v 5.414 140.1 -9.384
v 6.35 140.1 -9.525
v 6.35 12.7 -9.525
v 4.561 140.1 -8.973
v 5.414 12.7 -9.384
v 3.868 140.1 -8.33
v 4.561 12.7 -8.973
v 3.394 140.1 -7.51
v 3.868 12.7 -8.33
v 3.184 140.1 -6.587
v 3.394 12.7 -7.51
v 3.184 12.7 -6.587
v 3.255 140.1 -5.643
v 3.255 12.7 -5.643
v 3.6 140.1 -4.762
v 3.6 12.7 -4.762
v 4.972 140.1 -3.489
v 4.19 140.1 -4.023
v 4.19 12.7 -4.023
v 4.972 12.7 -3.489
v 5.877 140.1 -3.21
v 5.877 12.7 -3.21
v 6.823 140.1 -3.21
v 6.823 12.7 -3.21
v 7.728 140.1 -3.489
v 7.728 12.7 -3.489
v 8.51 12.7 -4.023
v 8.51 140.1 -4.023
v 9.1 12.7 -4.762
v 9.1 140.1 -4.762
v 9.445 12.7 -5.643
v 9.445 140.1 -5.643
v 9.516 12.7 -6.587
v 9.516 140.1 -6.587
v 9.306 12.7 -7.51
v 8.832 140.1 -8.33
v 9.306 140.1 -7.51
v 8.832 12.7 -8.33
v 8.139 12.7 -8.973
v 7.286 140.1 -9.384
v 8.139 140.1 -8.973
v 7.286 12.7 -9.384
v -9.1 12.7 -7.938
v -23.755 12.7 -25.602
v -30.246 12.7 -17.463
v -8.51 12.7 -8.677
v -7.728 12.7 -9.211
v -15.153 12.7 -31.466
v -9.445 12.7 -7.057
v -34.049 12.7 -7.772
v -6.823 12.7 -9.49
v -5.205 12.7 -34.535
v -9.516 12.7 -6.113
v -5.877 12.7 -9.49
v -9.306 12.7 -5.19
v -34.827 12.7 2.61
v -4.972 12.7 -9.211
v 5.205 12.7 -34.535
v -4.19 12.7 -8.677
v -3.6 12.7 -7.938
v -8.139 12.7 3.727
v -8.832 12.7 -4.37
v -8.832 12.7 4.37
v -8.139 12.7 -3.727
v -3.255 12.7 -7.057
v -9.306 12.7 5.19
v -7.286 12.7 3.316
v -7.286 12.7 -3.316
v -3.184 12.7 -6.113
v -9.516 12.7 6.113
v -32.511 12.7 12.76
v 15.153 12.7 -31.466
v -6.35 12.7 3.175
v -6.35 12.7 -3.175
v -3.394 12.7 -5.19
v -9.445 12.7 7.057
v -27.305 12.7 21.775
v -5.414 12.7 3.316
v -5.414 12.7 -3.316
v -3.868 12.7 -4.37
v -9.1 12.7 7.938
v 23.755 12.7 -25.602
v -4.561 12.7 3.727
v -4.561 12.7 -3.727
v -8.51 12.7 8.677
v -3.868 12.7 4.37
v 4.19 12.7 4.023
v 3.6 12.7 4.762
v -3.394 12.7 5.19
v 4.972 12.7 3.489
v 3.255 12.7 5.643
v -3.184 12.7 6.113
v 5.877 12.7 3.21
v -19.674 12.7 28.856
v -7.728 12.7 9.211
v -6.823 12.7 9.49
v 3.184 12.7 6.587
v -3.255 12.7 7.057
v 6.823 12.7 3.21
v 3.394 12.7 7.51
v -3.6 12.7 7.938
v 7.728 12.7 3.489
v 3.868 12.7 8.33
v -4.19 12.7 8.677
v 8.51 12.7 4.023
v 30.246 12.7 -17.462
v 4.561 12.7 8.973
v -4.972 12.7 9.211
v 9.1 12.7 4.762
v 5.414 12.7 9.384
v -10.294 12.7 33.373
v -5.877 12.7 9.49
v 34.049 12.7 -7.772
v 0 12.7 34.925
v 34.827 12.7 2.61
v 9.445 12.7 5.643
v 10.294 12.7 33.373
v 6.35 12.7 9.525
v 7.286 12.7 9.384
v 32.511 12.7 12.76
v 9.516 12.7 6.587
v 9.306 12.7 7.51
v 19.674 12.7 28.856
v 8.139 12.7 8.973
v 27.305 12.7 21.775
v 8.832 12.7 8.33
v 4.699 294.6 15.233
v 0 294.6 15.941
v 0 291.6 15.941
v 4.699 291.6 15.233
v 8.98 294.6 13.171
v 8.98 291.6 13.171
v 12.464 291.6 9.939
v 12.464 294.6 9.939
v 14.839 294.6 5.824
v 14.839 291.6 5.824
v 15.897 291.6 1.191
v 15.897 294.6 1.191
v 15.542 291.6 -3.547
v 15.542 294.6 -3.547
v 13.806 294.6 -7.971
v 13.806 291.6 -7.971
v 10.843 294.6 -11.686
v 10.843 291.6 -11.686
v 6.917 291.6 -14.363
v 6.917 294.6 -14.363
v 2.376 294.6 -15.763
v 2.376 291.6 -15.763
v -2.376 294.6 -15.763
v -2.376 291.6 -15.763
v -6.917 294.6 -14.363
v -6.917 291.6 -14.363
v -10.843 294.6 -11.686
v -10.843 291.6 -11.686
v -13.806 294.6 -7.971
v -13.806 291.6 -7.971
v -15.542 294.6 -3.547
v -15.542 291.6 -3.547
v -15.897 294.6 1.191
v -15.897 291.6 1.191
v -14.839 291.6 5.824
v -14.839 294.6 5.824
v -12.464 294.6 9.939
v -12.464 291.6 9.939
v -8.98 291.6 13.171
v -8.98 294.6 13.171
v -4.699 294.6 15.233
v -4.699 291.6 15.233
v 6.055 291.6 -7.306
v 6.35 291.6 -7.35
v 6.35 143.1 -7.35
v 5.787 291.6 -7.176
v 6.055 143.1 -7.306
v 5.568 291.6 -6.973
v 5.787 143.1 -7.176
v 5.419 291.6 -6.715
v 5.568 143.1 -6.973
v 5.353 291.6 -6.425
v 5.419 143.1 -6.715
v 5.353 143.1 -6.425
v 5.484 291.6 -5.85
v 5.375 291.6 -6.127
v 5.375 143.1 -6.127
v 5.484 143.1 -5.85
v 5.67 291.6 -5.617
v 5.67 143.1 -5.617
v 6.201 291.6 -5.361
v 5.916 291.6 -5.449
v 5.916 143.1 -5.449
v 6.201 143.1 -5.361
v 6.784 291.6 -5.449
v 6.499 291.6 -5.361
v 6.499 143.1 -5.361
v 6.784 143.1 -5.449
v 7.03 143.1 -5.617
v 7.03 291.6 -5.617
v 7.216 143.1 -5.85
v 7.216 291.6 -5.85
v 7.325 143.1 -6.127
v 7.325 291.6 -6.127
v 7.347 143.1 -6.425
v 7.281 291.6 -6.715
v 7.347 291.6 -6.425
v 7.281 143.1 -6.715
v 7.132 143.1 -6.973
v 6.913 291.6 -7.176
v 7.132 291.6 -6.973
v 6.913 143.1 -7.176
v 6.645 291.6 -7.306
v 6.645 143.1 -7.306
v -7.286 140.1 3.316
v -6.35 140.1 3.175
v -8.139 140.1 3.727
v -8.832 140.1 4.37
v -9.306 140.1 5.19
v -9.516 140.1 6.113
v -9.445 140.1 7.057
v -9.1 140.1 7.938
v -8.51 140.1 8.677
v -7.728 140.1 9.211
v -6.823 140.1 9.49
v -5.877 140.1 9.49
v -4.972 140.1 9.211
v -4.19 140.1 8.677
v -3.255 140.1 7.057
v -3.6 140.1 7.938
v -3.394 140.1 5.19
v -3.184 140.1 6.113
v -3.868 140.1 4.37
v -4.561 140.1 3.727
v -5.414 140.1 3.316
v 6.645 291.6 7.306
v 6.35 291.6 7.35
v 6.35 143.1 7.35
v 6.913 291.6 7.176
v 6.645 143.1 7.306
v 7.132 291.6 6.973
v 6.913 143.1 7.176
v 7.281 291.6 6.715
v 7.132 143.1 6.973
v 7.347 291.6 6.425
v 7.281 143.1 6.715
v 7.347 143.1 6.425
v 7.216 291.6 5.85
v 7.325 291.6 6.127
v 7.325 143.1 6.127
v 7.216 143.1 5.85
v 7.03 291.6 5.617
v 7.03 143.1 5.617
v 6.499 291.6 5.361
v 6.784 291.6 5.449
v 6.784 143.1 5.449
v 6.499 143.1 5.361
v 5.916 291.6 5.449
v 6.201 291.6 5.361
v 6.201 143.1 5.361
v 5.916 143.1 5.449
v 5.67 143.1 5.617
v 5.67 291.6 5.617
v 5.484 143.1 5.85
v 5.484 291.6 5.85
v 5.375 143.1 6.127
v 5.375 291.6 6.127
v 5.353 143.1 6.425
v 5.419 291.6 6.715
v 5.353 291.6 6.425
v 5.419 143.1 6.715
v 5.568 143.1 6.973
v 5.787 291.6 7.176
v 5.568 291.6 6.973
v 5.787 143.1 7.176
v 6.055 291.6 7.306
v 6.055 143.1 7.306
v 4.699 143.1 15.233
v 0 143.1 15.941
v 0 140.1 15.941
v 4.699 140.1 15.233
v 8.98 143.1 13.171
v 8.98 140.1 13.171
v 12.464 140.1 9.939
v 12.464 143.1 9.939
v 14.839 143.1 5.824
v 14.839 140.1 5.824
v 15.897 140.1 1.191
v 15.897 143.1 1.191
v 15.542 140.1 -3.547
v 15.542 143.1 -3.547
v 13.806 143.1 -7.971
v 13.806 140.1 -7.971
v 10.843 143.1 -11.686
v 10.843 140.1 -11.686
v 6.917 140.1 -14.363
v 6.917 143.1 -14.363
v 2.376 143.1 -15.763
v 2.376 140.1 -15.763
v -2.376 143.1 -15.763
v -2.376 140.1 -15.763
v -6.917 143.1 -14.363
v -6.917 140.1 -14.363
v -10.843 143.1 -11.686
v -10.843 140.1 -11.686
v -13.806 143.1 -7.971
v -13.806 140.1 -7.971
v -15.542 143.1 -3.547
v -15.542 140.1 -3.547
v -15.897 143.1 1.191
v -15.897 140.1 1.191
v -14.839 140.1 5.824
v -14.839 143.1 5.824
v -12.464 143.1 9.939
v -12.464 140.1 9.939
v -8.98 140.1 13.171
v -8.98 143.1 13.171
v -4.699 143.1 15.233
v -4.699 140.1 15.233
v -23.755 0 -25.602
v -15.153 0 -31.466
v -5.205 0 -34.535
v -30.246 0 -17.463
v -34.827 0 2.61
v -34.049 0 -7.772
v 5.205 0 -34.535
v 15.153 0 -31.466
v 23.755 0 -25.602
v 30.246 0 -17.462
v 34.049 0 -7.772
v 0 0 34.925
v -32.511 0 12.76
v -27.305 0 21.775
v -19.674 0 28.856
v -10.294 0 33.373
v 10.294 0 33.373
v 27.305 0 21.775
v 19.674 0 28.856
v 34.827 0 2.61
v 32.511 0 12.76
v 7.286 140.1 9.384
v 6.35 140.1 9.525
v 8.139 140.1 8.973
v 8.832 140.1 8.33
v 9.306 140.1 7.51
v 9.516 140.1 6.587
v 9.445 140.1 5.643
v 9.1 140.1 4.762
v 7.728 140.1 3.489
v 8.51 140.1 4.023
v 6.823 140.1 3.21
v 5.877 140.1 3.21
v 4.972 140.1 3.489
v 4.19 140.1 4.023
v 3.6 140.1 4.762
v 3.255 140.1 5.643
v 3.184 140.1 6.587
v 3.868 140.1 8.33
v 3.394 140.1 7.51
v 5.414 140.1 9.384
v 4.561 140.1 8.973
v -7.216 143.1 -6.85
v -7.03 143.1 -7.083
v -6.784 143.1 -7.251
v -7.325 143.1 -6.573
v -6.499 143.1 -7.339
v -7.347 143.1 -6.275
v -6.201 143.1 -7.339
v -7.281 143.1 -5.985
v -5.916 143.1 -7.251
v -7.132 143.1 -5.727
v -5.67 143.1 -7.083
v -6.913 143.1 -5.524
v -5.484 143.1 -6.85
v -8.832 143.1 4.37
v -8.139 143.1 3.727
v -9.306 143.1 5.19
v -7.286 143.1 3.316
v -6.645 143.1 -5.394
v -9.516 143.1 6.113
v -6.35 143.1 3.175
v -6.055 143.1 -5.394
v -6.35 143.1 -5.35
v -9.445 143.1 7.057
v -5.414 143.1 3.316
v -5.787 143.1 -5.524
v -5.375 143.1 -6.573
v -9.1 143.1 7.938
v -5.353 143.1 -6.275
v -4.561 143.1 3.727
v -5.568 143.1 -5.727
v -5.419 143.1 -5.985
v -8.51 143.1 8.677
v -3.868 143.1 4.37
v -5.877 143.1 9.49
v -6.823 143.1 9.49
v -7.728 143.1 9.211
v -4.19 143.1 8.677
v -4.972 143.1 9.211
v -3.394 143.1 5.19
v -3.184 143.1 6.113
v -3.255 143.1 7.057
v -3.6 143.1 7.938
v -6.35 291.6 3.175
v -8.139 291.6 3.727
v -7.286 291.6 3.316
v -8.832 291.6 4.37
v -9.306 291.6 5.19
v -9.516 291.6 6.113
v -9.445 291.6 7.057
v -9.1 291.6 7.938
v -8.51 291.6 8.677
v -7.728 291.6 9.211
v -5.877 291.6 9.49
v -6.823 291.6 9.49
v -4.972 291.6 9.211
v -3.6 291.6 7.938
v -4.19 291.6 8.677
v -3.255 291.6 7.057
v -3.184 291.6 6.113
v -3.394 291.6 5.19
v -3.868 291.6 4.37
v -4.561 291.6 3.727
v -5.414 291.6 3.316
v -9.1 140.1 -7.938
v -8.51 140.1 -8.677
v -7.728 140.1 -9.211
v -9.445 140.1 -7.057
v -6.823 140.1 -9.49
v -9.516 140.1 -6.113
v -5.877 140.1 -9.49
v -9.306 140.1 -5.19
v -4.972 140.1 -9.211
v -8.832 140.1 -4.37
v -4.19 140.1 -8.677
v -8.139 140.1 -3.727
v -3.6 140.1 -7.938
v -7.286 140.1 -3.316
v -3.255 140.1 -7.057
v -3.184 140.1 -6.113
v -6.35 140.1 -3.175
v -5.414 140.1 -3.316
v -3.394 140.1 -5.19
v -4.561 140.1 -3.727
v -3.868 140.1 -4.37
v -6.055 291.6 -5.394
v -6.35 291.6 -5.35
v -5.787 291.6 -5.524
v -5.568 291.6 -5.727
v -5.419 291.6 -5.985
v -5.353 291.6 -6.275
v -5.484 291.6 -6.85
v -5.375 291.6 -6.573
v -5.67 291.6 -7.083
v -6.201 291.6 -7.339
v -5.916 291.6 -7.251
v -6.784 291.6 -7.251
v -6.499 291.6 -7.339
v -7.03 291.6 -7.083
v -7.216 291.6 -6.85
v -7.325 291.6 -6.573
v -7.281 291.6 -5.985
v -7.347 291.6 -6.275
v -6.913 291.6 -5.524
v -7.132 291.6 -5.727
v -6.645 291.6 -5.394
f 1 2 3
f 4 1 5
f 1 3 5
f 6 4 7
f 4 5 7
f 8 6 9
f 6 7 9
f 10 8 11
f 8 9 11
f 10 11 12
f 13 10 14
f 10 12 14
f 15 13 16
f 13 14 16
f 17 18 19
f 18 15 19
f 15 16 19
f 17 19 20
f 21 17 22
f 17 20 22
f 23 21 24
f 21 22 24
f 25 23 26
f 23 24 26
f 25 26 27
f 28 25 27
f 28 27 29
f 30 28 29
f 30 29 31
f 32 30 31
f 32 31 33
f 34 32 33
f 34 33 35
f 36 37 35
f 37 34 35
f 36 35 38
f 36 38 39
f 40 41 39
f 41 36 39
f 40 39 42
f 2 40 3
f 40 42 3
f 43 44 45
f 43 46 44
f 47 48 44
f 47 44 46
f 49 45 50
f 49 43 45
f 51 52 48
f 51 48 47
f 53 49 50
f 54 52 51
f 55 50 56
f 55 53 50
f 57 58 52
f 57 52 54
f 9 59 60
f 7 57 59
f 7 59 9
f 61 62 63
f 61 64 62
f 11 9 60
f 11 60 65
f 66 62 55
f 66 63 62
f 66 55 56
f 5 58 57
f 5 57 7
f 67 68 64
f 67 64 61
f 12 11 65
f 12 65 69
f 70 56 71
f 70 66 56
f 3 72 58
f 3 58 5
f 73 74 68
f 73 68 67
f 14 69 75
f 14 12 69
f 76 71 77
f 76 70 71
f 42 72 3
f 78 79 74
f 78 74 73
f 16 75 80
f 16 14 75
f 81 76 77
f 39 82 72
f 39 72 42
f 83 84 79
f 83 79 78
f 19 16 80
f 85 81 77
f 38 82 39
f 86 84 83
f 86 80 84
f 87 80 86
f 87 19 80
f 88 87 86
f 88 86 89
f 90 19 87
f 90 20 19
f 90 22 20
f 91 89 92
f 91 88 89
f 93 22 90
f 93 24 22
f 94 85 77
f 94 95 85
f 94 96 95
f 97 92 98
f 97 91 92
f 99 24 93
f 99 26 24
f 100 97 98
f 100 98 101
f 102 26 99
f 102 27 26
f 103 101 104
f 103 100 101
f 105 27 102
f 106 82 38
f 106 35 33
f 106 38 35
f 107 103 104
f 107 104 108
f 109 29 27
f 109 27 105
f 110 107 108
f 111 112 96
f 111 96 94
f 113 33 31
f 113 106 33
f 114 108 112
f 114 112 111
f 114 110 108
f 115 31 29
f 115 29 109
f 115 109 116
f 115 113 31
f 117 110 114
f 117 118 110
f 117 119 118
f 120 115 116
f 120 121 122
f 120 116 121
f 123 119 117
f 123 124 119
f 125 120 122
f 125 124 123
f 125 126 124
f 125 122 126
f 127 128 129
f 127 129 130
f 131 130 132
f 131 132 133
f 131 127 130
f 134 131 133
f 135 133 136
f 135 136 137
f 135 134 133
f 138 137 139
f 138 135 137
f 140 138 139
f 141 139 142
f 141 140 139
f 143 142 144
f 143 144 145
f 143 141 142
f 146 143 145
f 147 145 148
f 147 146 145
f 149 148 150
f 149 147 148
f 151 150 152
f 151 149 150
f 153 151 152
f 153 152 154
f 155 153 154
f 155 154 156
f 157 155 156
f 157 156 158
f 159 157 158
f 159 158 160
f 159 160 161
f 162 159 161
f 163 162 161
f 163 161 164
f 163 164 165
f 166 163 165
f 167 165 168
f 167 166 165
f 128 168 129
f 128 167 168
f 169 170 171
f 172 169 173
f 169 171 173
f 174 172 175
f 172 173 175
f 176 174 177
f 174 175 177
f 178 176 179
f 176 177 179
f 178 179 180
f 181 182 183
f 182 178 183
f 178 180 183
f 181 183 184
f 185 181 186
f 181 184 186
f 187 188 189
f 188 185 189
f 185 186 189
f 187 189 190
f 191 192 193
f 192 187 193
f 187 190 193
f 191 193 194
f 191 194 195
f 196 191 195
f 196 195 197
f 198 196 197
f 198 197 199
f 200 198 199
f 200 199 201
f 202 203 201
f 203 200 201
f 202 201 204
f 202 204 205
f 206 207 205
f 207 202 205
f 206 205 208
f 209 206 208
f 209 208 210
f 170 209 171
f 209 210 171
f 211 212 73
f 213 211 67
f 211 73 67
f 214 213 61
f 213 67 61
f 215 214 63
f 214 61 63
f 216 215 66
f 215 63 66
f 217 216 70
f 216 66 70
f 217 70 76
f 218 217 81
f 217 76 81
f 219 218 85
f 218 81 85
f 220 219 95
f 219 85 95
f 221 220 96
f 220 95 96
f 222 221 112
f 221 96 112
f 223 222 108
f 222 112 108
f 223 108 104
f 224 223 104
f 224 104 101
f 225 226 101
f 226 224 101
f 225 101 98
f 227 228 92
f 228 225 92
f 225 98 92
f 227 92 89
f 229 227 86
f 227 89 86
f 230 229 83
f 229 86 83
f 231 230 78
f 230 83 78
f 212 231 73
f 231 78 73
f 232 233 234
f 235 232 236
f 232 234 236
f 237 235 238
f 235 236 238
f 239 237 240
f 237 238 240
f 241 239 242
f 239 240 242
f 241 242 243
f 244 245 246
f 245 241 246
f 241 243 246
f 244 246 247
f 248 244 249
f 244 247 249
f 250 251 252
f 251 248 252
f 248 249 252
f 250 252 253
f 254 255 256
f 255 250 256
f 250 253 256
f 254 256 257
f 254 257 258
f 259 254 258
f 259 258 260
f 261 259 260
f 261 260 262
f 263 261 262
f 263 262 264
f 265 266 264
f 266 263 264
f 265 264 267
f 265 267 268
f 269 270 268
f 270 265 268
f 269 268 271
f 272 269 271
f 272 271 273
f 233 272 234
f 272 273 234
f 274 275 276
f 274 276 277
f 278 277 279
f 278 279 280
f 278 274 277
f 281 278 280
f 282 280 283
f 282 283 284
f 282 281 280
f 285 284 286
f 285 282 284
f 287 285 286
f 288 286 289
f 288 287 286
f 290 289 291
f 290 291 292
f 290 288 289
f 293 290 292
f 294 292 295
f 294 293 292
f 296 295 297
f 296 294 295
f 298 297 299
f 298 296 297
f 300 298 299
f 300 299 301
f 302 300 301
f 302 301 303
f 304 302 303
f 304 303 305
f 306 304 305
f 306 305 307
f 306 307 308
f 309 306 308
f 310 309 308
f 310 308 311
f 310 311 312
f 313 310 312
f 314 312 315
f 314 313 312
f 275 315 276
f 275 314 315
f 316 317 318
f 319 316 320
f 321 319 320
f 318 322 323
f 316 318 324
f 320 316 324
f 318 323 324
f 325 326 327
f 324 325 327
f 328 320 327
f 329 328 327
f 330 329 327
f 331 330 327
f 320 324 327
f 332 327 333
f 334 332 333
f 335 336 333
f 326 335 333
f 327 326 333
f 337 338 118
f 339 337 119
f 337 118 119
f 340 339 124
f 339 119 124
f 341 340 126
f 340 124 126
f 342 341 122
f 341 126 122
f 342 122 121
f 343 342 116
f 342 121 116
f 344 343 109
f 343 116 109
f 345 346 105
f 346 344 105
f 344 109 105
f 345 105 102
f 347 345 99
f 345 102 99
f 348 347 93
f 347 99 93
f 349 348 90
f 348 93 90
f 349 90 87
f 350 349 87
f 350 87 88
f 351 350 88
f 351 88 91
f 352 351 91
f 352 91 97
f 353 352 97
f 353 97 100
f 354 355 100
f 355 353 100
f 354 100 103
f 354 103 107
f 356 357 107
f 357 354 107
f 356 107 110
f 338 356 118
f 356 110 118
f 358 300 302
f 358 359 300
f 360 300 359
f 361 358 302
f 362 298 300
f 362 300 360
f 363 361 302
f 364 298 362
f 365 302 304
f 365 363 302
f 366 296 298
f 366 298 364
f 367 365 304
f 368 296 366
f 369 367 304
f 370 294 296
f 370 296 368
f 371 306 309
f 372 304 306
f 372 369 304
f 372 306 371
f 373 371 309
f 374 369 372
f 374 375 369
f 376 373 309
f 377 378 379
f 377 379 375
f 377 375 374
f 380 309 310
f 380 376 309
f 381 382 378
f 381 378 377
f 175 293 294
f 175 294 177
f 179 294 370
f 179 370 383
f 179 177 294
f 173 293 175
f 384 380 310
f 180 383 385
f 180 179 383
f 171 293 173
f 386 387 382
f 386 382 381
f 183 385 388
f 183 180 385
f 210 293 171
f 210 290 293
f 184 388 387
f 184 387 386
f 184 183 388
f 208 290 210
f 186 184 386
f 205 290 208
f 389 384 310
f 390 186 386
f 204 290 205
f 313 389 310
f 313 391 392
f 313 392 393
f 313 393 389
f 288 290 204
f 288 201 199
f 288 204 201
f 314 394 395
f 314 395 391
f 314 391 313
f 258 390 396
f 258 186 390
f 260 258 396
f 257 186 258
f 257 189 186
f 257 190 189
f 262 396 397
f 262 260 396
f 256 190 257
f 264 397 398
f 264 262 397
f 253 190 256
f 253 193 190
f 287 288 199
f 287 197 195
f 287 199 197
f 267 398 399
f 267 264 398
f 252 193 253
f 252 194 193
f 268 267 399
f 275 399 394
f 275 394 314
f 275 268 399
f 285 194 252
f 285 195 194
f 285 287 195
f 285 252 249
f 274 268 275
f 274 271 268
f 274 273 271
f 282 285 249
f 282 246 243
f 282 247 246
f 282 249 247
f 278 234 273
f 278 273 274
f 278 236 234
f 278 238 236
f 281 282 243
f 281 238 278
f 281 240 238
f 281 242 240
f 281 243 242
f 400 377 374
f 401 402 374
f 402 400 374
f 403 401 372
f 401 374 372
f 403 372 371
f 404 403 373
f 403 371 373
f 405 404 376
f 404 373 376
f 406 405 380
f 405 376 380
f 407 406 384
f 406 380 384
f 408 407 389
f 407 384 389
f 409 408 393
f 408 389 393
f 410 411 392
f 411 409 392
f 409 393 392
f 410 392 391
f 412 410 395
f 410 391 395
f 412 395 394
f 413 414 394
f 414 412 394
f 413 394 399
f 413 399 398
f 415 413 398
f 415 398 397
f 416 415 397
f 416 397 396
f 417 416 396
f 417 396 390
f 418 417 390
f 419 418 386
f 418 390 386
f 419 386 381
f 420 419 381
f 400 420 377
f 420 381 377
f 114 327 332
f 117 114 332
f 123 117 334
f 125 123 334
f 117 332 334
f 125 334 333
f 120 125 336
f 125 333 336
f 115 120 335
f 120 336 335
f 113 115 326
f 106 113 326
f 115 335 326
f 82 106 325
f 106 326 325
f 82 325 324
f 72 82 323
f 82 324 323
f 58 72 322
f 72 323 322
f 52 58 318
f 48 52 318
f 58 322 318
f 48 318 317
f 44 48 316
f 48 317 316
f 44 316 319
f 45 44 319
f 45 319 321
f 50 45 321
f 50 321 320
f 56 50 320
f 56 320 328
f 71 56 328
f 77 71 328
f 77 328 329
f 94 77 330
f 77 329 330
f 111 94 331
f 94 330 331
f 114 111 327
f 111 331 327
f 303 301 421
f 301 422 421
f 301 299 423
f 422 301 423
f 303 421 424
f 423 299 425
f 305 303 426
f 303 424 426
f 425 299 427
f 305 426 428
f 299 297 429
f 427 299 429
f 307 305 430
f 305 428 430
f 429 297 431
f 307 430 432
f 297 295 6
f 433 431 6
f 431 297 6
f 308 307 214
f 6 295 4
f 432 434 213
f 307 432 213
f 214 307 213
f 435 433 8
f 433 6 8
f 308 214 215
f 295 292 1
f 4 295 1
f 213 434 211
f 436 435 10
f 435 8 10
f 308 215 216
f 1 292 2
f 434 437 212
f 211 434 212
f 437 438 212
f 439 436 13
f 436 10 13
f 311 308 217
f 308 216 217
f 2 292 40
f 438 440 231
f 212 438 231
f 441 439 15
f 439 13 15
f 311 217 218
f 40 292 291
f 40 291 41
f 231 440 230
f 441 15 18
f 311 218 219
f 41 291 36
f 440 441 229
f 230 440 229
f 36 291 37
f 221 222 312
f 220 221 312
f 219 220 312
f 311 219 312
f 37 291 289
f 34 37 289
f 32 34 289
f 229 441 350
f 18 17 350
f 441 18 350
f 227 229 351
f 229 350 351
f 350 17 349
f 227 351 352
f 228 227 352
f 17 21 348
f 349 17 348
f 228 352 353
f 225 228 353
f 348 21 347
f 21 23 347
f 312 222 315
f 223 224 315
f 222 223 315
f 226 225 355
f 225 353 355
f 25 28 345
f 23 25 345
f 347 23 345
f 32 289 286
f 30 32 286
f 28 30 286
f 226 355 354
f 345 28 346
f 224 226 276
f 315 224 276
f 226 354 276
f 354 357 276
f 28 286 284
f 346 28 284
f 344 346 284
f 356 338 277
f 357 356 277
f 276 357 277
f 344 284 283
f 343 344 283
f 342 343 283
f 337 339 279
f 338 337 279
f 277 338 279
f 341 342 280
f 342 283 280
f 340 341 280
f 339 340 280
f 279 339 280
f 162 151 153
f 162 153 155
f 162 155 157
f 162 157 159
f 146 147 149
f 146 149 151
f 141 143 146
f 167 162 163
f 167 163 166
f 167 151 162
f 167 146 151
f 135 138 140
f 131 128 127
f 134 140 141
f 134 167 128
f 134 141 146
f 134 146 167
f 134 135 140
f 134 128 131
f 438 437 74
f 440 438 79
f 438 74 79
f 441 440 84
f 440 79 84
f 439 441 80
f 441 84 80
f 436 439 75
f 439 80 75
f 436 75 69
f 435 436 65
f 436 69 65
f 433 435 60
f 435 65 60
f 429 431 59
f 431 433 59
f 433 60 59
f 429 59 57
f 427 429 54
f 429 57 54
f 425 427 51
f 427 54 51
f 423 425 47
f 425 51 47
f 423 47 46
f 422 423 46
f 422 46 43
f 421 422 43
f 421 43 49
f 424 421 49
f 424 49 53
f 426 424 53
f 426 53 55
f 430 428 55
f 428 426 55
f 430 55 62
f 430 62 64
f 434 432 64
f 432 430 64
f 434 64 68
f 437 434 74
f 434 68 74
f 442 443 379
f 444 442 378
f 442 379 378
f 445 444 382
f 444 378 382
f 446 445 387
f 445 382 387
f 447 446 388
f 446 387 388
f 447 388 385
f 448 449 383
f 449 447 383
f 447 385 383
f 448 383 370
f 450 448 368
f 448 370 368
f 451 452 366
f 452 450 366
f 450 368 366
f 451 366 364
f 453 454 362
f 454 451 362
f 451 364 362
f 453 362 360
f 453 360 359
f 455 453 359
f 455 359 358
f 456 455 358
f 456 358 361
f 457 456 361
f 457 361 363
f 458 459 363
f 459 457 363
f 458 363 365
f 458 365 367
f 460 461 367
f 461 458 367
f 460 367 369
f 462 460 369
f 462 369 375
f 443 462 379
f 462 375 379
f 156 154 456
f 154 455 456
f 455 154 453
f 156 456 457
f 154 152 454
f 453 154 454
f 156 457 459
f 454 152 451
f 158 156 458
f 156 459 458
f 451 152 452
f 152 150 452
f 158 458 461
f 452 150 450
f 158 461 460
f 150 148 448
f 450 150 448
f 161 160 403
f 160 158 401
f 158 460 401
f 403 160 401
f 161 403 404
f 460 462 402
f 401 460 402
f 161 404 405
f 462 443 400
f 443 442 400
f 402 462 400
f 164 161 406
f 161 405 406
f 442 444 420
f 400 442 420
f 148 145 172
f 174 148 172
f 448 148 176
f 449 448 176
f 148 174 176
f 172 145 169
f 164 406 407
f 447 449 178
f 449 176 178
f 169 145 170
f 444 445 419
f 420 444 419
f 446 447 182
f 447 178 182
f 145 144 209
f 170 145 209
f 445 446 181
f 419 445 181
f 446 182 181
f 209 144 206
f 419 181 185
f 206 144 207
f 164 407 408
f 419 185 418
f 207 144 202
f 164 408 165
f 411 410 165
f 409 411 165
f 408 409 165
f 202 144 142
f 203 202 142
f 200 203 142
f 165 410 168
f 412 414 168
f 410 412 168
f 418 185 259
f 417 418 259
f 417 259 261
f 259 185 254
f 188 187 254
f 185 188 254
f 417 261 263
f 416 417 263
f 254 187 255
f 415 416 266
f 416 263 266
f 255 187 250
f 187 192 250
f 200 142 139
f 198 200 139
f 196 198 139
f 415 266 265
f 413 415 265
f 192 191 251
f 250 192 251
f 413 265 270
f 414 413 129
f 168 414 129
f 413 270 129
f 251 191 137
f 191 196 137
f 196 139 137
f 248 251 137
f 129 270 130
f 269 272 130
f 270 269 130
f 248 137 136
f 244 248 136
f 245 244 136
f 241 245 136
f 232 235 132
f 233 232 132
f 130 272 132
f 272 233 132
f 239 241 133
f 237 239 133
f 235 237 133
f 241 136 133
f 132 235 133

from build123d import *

# Parameters (mm, degrees)
SKETCH1_R           = 34.925
BOSS_EXTRUDE1_DEPTH = 12.7
SKETCH2_R           = 3.175
BOSS_EXTRUDE2_DEPTH = 130.4
SKETCH3_R           = 3.175
BOSS_EXTRUDE3_DEPTH = 151.5
SKETCH4_R           = 1
BOSS_EXTRUDE4_DEPTH = 151.5
SKETCH5_R           = 15.941442814
BOSS_EXTRUDE5_DEPTH = 3
SKETCH6_R           = 15.941442814
BOSS_EXTRUDE6_DEPTH = 3


with BuildPart() as part:
    # Sketch1 → Boss-Extrude1 (new body)
    with BuildSketch(Plane(origin=(0, 0, 0), x_dir=(1, 0, 0), z_dir=(0, 1, 0))):
        with Locations(Location((0, 0, 0), (0, 0, 270))):
            Circle(SKETCH1_R)
    extrude(amount=BOSS_EXTRUDE1_DEPTH)

    # Sketch2 → Boss-Extrude2 (add)
    with BuildSketch(Plane(origin=(0, 12.7, 0), x_dir=(1, 0, 0), z_dir=(0, 1, 0))):
        with Locations(Location((-6.35, 6.35, 0), (0, 0, 270))):
            Circle(SKETCH2_R)
        with Locations(Location((6.35, 6.35, 0), (0, 0, 90))):
            Circle(SKETCH2_R)
        with Locations(Location((6.35, -6.35, 0), (0, 0, 270))):
            Circle(SKETCH2_R)
        with Locations(Location((-6.35, -6.35, 0), (0, 0, 90))):
            Circle(SKETCH2_R)
    extrude(amount=BOSS_EXTRUDE2_DEPTH)

    # Sketch3 → Boss-Extrude3 (add)
    with BuildSketch(Plane(origin=(0, 143.1, 0), x_dir=(1, 0, 0), z_dir=(0, 1, 0))):
        with Locations(Location((-6.35, -6.35, 0), (0, 0, 90))):
            Circle(SKETCH3_R)
    extrude(amount=BOSS_EXTRUDE3_DEPTH)

    # Sketch4 → Boss-Extrude4 (add)
    with BuildSketch(Plane(origin=(0, 143.1, 0), x_dir=(1, 0, 0), z_dir=(0, 1, 0))):
        with Locations(Location((-6.35, 6.35, 0), (0, 0, 270))):
            Circle(SKETCH4_R)
        with Locations(Location((6.35, 6.35, 0), (0, 0, 90))):
            Circle(SKETCH4_R)
        with Locations(Location((6.35, -6.35, 0), (0, 0, 270))):
            Circle(SKETCH4_R)
    extrude(amount=BOSS_EXTRUDE4_DEPTH)

    # Sketch5 → Boss-Extrude5 (add)
    with BuildSketch(Plane(origin=(0, 143.1, 0), x_dir=(1, 0, 0), z_dir=(0, 1, 0))):
        with Locations(Location((0, 0, 0), (0, 0, 270))):
            Circle(SKETCH5_R)
    extrude(amount=-BOSS_EXTRUDE5_DEPTH)

    # Sketch6 → Boss-Extrude6 (add)
    with BuildSketch(Plane(origin=(0, 294.6, 0), x_dir=(1, 0, 0), z_dir=(0, 1, 0))):
        with Locations(Location((0, 0, 0), (0, 0, 270))):
            Circle(SKETCH6_R)
    extrude(amount=-BOSS_EXTRUDE6_DEPTH)


solid = part.part
